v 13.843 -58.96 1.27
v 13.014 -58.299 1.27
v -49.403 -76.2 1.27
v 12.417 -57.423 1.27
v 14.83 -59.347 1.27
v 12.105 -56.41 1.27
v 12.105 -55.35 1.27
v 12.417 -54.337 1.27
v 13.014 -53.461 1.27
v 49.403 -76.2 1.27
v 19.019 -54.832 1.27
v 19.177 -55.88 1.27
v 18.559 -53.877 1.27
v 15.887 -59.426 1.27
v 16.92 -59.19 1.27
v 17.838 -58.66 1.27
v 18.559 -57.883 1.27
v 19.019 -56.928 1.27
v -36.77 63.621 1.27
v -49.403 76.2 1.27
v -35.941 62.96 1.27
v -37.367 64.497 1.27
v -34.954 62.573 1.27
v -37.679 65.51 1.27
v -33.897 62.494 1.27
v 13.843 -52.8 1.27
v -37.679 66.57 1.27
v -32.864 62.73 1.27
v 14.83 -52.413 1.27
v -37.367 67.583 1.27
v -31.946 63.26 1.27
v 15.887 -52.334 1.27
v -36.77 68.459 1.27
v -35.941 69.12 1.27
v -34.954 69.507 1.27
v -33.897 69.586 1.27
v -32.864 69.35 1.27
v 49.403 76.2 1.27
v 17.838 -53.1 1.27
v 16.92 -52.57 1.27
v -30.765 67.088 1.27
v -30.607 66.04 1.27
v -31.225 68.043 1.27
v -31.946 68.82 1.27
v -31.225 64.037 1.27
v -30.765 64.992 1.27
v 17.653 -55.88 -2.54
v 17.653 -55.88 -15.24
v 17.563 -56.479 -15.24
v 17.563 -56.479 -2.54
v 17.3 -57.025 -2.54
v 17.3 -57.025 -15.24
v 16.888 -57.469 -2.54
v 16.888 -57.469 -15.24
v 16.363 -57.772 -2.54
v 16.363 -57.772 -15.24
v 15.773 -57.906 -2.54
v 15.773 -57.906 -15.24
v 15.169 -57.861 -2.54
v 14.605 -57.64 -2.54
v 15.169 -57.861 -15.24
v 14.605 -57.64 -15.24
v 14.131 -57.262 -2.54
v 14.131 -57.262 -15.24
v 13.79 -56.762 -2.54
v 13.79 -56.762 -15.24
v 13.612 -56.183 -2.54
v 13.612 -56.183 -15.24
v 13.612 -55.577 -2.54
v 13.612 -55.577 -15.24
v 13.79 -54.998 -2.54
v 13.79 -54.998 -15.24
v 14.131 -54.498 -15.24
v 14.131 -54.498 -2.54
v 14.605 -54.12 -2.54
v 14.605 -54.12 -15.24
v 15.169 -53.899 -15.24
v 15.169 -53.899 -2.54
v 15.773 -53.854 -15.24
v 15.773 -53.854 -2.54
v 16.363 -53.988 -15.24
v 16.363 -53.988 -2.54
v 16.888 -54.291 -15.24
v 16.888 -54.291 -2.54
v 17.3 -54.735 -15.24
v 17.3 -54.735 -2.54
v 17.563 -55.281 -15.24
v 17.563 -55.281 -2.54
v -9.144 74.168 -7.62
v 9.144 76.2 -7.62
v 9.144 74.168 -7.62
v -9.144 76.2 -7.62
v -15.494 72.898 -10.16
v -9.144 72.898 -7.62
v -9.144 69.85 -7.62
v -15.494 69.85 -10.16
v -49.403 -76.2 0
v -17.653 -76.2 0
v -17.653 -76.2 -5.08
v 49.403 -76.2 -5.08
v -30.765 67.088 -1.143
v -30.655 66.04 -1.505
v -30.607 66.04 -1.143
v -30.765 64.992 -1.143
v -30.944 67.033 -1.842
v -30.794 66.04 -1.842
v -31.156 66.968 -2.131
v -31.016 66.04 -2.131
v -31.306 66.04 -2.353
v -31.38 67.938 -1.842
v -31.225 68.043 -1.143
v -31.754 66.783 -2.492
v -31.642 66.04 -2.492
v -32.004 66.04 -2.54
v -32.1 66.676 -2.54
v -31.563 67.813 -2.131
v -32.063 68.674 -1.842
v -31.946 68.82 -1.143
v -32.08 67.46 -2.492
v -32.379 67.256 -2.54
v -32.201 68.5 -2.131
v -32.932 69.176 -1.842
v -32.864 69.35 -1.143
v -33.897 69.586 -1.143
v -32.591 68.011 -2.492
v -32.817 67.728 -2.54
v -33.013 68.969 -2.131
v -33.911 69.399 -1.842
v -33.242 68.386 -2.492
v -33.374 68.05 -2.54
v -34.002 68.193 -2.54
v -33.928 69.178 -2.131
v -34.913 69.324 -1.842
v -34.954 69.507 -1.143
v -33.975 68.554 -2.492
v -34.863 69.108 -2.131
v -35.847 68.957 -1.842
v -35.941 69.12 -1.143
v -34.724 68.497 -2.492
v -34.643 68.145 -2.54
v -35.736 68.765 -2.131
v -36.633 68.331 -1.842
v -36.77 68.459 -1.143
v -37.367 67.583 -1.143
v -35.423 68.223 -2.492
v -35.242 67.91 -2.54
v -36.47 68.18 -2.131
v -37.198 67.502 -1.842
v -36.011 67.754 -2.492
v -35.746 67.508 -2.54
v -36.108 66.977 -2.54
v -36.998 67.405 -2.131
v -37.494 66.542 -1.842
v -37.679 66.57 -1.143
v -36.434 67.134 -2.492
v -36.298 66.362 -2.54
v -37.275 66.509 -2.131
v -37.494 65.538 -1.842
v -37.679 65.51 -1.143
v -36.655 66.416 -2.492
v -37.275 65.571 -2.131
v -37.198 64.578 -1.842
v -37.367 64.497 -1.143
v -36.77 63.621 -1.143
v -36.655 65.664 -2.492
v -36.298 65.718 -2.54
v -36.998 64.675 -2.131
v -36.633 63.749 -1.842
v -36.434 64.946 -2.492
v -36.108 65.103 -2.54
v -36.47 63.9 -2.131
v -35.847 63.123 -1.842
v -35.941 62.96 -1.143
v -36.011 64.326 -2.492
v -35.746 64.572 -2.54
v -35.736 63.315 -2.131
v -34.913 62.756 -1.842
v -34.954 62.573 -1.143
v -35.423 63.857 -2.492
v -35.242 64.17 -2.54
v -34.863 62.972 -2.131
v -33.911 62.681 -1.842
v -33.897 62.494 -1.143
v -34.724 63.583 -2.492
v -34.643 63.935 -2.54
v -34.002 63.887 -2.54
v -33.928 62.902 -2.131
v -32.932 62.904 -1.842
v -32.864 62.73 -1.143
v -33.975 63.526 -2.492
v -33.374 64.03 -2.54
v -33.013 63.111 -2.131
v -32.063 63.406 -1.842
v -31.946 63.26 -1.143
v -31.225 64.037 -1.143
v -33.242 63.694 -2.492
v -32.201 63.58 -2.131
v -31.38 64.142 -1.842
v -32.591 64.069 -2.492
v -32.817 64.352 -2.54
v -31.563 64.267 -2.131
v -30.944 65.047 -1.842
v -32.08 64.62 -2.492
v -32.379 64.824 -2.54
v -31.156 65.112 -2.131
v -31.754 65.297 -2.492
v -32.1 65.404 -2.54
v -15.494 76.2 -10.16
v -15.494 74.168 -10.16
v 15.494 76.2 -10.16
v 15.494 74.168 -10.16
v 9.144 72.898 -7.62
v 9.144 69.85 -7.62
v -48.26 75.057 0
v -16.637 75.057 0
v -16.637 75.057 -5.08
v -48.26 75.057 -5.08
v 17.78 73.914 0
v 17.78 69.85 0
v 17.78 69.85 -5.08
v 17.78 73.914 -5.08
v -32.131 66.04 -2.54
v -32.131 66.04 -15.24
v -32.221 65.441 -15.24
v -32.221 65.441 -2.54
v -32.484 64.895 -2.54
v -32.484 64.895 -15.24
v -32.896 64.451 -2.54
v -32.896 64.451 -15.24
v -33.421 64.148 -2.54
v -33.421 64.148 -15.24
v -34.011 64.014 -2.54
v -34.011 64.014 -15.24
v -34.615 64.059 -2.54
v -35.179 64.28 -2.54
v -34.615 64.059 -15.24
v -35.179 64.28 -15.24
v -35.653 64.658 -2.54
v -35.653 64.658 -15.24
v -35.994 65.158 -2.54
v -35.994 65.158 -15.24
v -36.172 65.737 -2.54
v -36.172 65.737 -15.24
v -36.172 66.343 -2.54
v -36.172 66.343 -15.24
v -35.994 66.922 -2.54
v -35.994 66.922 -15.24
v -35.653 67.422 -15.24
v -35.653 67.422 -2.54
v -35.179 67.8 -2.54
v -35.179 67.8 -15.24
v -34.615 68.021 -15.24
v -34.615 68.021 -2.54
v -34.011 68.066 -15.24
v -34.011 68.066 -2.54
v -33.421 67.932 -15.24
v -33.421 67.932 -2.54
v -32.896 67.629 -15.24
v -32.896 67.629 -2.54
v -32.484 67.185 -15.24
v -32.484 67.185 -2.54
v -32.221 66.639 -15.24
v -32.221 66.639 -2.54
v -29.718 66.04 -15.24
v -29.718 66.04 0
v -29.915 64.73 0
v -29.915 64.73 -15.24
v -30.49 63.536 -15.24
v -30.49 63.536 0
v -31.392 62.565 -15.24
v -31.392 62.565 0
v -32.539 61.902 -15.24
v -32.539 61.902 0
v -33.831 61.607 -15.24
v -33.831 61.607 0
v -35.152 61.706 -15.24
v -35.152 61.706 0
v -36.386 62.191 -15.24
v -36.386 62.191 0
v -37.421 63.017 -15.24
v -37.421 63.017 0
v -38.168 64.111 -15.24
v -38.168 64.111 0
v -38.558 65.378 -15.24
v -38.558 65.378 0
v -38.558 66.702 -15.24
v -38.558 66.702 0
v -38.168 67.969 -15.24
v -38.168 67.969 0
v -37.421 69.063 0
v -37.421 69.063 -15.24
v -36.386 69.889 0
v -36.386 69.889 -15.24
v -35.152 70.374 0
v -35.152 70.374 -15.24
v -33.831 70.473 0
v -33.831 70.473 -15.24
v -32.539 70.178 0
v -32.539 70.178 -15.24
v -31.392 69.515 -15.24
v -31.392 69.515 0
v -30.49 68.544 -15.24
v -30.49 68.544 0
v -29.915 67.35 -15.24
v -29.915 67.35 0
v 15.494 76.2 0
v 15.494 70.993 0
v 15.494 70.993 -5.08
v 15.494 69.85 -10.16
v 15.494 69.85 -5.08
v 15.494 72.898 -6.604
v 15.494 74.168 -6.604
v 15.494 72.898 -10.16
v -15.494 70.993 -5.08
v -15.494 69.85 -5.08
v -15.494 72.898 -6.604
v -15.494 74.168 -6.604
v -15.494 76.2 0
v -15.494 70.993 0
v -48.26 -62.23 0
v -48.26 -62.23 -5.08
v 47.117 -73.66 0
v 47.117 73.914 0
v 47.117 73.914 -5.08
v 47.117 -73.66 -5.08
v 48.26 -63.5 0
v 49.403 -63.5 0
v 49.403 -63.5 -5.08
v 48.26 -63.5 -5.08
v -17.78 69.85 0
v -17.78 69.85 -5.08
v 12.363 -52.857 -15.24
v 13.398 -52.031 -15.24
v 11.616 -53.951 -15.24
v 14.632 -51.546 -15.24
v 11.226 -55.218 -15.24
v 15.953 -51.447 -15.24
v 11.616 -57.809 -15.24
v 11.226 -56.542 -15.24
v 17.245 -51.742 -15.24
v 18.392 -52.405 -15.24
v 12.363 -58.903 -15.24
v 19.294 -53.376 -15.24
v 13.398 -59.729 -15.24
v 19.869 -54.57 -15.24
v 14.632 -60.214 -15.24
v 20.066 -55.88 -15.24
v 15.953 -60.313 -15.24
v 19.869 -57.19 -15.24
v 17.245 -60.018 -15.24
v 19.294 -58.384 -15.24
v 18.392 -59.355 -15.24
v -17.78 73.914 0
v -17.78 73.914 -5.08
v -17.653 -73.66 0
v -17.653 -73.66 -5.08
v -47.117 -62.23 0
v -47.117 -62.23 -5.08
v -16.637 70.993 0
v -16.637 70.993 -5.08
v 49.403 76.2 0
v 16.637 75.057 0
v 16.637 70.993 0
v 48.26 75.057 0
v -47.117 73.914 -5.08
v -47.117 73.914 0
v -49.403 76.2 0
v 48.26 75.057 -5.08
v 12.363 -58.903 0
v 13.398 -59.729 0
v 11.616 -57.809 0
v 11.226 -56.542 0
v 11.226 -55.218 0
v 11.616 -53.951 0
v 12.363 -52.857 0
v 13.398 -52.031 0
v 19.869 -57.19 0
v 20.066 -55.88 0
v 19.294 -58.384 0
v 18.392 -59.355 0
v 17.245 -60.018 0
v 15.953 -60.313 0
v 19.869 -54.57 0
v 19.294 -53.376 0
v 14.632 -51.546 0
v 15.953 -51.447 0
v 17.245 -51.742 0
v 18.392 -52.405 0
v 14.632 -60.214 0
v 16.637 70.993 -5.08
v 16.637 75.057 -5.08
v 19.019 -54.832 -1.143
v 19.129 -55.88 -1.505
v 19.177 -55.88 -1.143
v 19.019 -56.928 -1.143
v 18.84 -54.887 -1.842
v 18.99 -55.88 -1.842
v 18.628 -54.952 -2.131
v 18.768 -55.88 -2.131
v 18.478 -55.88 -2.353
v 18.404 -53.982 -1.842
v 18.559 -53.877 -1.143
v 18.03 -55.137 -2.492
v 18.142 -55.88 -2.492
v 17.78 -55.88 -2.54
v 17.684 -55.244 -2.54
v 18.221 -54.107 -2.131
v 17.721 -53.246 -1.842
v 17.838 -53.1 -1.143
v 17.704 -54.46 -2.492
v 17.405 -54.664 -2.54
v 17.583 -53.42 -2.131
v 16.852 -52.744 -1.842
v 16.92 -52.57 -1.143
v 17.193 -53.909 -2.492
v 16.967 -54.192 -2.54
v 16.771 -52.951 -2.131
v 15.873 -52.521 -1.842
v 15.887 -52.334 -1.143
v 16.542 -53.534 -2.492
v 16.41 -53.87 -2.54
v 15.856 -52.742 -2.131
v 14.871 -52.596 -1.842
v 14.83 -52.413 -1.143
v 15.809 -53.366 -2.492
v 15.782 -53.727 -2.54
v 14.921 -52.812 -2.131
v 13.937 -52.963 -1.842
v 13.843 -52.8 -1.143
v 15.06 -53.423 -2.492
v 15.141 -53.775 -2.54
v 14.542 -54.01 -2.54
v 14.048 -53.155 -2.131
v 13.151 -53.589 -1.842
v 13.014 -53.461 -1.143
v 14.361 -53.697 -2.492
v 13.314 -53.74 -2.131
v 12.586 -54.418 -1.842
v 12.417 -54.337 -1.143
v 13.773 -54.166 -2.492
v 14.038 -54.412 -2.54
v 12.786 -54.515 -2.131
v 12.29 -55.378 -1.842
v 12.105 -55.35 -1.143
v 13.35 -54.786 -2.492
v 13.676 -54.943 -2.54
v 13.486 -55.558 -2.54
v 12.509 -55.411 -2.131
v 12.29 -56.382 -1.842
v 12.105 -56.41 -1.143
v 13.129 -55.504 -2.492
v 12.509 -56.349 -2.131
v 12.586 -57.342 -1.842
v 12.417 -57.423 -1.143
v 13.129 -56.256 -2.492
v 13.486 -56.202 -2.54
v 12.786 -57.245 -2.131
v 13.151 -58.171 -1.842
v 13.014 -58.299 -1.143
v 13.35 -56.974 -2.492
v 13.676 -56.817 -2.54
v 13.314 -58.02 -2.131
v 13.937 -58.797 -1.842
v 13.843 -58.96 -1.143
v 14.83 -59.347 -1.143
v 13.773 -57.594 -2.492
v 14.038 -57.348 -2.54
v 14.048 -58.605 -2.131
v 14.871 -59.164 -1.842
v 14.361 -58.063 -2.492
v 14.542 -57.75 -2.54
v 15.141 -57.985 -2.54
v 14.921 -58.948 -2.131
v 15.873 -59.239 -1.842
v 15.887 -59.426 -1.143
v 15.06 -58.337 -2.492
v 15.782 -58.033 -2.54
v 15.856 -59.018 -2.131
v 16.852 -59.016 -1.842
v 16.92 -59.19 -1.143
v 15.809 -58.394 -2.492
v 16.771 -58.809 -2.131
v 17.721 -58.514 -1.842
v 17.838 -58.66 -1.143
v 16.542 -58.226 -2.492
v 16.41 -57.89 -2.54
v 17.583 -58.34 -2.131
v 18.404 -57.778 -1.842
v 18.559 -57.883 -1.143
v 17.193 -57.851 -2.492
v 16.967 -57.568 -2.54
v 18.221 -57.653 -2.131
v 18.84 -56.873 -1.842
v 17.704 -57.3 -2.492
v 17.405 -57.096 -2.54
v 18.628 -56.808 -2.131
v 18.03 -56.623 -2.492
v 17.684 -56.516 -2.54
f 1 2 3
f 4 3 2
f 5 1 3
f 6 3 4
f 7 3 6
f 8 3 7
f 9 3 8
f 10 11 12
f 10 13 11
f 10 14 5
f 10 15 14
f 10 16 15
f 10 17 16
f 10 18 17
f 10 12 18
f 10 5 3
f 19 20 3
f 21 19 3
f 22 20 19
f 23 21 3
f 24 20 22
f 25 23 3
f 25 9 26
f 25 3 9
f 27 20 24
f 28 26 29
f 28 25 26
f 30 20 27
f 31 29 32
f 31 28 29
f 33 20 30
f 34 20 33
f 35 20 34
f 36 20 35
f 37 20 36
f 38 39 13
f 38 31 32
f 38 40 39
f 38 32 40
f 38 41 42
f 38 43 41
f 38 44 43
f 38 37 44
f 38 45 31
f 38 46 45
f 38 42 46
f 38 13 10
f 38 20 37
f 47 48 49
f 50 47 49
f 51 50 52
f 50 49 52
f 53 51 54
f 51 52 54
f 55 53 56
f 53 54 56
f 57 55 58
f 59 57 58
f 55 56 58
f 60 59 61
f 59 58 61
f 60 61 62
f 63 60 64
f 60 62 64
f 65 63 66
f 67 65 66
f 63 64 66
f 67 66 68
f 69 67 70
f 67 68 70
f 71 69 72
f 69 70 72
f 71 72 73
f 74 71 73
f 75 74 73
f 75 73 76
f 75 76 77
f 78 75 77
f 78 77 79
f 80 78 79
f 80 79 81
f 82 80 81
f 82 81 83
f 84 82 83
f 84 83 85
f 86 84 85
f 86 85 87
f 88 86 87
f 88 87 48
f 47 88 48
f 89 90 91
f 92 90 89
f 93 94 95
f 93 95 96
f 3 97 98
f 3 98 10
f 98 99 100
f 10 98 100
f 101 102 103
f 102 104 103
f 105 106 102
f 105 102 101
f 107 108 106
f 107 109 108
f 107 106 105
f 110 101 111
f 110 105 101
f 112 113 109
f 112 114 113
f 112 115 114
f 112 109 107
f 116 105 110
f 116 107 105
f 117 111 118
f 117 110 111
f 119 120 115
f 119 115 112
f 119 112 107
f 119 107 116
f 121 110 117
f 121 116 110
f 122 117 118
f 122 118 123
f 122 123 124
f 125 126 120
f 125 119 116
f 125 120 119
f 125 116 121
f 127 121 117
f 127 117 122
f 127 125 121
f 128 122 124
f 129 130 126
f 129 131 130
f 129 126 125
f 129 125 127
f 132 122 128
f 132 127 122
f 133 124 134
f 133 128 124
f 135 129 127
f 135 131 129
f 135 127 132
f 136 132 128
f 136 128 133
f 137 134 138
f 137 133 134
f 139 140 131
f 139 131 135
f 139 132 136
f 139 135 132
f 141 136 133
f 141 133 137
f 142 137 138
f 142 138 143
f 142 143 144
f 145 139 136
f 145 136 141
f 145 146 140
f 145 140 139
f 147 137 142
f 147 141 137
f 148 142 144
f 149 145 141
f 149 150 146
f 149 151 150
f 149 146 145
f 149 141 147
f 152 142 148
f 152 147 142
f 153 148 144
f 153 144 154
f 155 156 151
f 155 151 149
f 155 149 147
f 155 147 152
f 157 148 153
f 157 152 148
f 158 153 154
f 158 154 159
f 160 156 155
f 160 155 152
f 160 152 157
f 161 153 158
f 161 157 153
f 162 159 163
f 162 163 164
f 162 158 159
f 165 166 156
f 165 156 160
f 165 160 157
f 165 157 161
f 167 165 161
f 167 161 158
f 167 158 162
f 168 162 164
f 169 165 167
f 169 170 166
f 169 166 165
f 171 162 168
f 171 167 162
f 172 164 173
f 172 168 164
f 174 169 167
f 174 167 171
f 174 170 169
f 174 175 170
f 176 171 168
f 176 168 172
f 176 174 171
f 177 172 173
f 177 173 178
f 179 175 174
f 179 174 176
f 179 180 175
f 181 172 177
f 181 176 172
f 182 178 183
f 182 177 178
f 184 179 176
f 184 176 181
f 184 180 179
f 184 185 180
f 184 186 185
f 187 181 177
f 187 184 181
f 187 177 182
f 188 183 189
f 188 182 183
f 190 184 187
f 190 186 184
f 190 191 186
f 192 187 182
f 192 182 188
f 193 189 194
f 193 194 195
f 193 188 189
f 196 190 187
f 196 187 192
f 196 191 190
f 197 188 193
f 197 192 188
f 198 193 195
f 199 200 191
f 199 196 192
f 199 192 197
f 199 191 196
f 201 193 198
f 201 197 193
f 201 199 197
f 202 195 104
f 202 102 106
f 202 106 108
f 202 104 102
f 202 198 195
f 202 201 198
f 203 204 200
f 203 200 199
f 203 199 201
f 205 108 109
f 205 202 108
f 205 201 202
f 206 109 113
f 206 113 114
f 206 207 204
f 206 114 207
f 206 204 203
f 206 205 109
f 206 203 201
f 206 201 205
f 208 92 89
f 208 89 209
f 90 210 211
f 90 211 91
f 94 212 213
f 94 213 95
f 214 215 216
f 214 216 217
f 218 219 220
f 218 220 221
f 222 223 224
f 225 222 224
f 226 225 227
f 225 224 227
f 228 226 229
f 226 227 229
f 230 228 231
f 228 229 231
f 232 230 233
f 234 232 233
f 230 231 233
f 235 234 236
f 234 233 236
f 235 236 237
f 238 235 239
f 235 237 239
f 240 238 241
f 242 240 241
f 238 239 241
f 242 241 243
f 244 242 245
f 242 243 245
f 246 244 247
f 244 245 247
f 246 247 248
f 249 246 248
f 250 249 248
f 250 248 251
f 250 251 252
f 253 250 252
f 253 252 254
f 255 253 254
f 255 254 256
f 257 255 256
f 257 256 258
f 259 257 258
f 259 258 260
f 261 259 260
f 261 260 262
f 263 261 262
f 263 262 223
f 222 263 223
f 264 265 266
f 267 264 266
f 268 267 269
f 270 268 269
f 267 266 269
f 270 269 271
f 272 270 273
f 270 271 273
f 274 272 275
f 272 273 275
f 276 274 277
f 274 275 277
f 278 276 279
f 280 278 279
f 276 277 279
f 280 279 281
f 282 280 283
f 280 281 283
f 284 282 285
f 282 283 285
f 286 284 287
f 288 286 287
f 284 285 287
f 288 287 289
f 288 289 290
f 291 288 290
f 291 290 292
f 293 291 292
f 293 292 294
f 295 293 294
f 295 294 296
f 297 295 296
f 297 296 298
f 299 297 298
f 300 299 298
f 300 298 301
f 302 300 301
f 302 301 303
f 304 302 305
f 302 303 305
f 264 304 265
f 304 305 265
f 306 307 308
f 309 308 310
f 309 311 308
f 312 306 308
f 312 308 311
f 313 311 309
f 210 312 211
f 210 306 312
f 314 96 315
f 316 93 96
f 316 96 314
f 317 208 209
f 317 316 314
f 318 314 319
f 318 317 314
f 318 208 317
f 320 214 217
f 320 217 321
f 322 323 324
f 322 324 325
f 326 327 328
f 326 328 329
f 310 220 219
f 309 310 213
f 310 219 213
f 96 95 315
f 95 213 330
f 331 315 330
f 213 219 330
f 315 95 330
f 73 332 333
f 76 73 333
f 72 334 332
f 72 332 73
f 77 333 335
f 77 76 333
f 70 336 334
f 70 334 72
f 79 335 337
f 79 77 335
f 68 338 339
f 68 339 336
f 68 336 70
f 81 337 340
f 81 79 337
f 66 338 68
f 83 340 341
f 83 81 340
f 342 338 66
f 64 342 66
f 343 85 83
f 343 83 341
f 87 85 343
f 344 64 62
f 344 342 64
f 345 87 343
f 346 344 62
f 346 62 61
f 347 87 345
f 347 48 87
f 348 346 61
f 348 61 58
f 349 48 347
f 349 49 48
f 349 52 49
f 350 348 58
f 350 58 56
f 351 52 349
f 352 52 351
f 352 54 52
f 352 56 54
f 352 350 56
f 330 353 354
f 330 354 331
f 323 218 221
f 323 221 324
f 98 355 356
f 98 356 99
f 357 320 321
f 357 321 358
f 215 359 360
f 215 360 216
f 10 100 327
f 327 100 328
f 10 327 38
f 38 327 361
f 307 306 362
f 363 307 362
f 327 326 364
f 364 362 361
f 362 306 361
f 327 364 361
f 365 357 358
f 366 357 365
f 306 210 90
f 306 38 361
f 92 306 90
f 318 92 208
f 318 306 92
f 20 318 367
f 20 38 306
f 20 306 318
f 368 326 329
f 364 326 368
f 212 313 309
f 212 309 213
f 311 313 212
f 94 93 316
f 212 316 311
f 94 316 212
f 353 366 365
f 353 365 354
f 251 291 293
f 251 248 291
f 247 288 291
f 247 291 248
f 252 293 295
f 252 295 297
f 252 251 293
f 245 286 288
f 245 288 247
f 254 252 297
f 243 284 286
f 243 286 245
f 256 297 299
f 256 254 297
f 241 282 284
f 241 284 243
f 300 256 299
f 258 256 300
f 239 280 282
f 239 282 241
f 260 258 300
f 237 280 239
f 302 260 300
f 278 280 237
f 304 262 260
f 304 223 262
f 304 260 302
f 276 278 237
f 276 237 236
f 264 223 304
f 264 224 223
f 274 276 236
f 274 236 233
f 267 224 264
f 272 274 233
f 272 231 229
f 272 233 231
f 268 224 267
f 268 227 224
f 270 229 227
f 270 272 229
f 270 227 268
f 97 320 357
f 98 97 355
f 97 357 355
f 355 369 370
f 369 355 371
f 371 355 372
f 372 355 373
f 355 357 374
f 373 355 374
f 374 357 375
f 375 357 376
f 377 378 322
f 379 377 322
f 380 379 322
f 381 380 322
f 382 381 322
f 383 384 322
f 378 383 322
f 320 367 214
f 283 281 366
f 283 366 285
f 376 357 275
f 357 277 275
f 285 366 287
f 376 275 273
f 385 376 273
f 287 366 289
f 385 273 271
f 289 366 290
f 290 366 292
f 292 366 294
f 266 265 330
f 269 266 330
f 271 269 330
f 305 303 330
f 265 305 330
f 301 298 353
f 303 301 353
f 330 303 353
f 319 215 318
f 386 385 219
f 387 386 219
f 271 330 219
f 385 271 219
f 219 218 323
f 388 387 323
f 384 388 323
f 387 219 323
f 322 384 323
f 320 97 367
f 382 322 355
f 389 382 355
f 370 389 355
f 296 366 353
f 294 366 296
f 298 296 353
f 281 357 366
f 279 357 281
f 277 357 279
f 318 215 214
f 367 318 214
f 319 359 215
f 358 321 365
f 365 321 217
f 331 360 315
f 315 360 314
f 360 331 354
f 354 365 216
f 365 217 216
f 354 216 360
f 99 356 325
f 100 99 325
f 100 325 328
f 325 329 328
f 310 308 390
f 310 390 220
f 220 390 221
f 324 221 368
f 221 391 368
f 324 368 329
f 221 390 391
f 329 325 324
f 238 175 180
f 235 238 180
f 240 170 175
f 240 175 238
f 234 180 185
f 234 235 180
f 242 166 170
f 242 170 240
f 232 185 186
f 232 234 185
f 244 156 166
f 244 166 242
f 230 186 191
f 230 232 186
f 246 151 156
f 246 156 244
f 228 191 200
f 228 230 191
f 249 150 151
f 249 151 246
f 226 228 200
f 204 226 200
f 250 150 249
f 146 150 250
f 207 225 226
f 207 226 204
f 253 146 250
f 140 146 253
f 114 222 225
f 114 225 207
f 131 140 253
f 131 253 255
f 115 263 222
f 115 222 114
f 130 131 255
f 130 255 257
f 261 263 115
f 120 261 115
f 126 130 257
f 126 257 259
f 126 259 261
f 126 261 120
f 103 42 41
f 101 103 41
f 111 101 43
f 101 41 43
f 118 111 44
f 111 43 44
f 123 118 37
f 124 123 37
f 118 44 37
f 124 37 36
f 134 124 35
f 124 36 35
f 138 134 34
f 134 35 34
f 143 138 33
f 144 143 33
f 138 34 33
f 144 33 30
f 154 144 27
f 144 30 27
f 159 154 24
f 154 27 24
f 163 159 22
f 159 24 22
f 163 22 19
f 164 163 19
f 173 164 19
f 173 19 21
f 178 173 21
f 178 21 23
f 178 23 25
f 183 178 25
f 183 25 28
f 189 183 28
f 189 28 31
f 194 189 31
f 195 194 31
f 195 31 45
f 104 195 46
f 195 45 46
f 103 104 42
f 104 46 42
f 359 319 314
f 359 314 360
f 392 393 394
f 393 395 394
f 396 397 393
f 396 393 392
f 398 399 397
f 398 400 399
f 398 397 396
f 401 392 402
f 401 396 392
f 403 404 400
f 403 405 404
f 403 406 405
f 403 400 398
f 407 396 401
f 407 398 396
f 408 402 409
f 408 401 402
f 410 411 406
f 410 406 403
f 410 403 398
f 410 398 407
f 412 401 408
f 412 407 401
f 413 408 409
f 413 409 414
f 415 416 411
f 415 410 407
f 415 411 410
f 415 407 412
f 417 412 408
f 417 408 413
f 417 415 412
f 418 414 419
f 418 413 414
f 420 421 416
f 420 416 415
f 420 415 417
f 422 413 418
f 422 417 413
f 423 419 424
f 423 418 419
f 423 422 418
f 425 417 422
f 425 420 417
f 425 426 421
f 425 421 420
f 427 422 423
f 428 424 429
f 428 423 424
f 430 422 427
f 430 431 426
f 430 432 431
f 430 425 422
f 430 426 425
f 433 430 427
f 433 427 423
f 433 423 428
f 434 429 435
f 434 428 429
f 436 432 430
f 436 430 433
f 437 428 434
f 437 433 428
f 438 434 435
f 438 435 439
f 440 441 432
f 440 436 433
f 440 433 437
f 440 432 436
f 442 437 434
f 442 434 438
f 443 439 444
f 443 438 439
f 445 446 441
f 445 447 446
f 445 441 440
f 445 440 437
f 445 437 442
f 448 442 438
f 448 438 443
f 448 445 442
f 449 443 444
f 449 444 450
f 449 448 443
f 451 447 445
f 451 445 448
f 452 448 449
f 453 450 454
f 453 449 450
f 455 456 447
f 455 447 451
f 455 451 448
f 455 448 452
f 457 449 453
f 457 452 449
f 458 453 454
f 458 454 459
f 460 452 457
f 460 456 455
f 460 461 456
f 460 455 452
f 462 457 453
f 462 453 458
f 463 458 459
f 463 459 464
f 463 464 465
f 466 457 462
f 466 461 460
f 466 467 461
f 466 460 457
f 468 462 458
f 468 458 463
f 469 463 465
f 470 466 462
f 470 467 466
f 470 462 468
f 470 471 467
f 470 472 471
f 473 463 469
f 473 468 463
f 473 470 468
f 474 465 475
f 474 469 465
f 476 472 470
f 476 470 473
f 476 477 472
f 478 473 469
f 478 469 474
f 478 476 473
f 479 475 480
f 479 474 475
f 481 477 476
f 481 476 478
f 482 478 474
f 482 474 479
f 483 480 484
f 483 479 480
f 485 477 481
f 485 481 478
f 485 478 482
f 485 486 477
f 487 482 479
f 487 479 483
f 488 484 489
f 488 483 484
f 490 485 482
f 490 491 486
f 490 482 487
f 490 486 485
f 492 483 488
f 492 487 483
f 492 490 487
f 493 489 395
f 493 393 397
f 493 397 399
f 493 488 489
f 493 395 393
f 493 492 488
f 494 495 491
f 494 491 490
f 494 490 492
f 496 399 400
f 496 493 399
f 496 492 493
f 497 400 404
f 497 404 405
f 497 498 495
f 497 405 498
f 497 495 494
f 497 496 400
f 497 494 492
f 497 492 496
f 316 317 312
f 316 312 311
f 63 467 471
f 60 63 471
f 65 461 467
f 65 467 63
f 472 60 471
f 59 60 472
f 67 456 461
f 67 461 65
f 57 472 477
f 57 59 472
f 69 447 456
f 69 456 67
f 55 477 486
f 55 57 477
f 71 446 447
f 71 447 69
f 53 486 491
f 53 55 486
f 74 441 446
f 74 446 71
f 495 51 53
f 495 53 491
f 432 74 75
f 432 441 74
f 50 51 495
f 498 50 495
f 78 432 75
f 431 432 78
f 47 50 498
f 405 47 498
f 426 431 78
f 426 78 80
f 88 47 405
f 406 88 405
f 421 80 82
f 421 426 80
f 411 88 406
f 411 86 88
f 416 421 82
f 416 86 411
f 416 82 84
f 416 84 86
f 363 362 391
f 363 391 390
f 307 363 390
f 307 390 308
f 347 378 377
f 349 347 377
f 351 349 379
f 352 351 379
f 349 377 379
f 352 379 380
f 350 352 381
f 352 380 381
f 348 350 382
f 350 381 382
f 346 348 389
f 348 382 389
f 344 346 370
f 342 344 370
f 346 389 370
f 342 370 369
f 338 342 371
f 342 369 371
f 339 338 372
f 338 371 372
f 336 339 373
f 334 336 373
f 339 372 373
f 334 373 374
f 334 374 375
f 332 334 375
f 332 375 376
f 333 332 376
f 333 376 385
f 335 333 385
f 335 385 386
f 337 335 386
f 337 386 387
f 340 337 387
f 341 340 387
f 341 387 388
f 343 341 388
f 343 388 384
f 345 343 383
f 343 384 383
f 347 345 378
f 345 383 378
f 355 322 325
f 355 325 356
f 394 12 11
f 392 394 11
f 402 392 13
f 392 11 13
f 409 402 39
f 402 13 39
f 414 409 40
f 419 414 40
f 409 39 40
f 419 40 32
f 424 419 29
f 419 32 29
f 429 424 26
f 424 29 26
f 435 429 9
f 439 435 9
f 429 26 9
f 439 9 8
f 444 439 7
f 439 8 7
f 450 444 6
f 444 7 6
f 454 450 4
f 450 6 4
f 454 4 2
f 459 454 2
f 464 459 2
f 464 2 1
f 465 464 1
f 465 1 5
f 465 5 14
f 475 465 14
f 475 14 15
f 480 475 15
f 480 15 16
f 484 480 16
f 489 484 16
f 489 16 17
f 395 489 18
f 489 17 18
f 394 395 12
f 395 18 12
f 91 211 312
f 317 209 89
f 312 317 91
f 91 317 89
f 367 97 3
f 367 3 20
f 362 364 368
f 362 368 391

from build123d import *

# Parameters (mm, degrees)
F0_W      = 98.806
F0_H      = 152.4
F1_DEPTH  = 1.27
F3_DEPTH  = 6.35
F4_R      = 4.445
F5_DEPTH  = 15.24
F6_R      = 2.032
F7_DEPTH  = 16.51
F8_R      = 3.556
F9_DEPTH  = 3.81
F11_DEPTH = 6.35
F12_W     = 1.27
F12_H     = 3.556
F13_DEPTH = 30.988
F14_R     = 1.397


with BuildPart() as f1:
    # F0 (on Top) → F1 (new body)
    with BuildSketch(Plane.XY):
        Rectangle(F0_W, F0_H)
    extrude(amount=F1_DEPTH)

    # F2 (on face) → F3 (join)
    with BuildSketch(Plane.XY.offset(1.27)):
        Polygon((-17.653, -73.66), (-17.653, -76.2), (49.403, -76.2), (49.403, -63.5), (48.26, -63.5), (48.26, 75.057), (16.637, 75.057), (16.637, 70.993), (15.494, 70.993), (15.494, 76.2), (-15.494, 76.2), (-15.494, 70.993), (-16.637, 70.993), (-16.637, 75.057), (-48.26, 75.057), (-48.26, -62.23), (-47.117, -62.23), (-47.117, 73.914), (-17.78, 73.914), (-17.78, 69.85), (17.78, 69.85), (17.78, 73.914), (47.117, 73.914), (47.117, -73.66), align=None)
    extrude(amount=-F3_DEPTH)

    # F4 (on face) → F5 (join)
    with BuildSketch(Plane(origin=(0, 0, 0), x_dir=(1, 0, 0), z_dir=(0, 0, -1))):
        with Locations((15.621, 55.88)):
            Circle(F4_R)
        with Locations((-34.163, -66.04)):
            Circle(F4_R)
    extrude(amount=F5_DEPTH)

    # F6 (on face) → F7 (cut, through all)
    with BuildSketch(Plane(origin=(0, 0, -15.24), x_dir=(1, 0, 0), z_dir=(0, 0, -1))):
        with Locations((-34.163, -66.04)):
            Circle(F6_R)
        with Locations((15.621, 55.88)):
            Circle(F6_R)
    extrude(amount=-F7_DEPTH, mode=Mode.SUBTRACT)

    # F8 (on face) → F9 (cut)
    with BuildSketch(Plane.XY.offset(1.27)):
        with Locations((15.621, -55.88)):
            Circle(F8_R)
        with Locations((-34.163, 66.04)):
            Circle(F8_R)
    extrude(amount=-F9_DEPTH, mode=Mode.SUBTRACT)

    # F10 (on face) → F11 (join, through all)
    with BuildSketch(Plane(origin=(0, 76.2, 0), x_dir=(-1, 0, 0), z_dir=(0, 1, 0))):
        Polygon((15.494, -5.08), (-15.494, -5.08), (-15.494, -10.16), (-9.144, -7.62), (9.144, -7.62), (15.494, -10.16), align=None)
    extrude(amount=-F11_DEPTH)

    # F12 (on face) → F13 (cut, through all)
    with BuildSketch(Plane(origin=(-15.494, 0, 0), x_dir=(0, -1, 0), z_dir=(-1, 0, 0))):
        with Locations((-73.533, -8.382)):
            Rectangle(F12_W, F12_H)
    extrude(amount=-F13_DEPTH, mode=Mode.SUBTRACT)

    # F14
    f14_edges = [f1.edges().sort_by_distance(p)[0] for p in [
        (12.065, -55.88, -2.54),
        (-37.719, 66.04, -2.54),
    ]]
    fillet(f14_edges, radius=F14_R)


solid = f1.part
